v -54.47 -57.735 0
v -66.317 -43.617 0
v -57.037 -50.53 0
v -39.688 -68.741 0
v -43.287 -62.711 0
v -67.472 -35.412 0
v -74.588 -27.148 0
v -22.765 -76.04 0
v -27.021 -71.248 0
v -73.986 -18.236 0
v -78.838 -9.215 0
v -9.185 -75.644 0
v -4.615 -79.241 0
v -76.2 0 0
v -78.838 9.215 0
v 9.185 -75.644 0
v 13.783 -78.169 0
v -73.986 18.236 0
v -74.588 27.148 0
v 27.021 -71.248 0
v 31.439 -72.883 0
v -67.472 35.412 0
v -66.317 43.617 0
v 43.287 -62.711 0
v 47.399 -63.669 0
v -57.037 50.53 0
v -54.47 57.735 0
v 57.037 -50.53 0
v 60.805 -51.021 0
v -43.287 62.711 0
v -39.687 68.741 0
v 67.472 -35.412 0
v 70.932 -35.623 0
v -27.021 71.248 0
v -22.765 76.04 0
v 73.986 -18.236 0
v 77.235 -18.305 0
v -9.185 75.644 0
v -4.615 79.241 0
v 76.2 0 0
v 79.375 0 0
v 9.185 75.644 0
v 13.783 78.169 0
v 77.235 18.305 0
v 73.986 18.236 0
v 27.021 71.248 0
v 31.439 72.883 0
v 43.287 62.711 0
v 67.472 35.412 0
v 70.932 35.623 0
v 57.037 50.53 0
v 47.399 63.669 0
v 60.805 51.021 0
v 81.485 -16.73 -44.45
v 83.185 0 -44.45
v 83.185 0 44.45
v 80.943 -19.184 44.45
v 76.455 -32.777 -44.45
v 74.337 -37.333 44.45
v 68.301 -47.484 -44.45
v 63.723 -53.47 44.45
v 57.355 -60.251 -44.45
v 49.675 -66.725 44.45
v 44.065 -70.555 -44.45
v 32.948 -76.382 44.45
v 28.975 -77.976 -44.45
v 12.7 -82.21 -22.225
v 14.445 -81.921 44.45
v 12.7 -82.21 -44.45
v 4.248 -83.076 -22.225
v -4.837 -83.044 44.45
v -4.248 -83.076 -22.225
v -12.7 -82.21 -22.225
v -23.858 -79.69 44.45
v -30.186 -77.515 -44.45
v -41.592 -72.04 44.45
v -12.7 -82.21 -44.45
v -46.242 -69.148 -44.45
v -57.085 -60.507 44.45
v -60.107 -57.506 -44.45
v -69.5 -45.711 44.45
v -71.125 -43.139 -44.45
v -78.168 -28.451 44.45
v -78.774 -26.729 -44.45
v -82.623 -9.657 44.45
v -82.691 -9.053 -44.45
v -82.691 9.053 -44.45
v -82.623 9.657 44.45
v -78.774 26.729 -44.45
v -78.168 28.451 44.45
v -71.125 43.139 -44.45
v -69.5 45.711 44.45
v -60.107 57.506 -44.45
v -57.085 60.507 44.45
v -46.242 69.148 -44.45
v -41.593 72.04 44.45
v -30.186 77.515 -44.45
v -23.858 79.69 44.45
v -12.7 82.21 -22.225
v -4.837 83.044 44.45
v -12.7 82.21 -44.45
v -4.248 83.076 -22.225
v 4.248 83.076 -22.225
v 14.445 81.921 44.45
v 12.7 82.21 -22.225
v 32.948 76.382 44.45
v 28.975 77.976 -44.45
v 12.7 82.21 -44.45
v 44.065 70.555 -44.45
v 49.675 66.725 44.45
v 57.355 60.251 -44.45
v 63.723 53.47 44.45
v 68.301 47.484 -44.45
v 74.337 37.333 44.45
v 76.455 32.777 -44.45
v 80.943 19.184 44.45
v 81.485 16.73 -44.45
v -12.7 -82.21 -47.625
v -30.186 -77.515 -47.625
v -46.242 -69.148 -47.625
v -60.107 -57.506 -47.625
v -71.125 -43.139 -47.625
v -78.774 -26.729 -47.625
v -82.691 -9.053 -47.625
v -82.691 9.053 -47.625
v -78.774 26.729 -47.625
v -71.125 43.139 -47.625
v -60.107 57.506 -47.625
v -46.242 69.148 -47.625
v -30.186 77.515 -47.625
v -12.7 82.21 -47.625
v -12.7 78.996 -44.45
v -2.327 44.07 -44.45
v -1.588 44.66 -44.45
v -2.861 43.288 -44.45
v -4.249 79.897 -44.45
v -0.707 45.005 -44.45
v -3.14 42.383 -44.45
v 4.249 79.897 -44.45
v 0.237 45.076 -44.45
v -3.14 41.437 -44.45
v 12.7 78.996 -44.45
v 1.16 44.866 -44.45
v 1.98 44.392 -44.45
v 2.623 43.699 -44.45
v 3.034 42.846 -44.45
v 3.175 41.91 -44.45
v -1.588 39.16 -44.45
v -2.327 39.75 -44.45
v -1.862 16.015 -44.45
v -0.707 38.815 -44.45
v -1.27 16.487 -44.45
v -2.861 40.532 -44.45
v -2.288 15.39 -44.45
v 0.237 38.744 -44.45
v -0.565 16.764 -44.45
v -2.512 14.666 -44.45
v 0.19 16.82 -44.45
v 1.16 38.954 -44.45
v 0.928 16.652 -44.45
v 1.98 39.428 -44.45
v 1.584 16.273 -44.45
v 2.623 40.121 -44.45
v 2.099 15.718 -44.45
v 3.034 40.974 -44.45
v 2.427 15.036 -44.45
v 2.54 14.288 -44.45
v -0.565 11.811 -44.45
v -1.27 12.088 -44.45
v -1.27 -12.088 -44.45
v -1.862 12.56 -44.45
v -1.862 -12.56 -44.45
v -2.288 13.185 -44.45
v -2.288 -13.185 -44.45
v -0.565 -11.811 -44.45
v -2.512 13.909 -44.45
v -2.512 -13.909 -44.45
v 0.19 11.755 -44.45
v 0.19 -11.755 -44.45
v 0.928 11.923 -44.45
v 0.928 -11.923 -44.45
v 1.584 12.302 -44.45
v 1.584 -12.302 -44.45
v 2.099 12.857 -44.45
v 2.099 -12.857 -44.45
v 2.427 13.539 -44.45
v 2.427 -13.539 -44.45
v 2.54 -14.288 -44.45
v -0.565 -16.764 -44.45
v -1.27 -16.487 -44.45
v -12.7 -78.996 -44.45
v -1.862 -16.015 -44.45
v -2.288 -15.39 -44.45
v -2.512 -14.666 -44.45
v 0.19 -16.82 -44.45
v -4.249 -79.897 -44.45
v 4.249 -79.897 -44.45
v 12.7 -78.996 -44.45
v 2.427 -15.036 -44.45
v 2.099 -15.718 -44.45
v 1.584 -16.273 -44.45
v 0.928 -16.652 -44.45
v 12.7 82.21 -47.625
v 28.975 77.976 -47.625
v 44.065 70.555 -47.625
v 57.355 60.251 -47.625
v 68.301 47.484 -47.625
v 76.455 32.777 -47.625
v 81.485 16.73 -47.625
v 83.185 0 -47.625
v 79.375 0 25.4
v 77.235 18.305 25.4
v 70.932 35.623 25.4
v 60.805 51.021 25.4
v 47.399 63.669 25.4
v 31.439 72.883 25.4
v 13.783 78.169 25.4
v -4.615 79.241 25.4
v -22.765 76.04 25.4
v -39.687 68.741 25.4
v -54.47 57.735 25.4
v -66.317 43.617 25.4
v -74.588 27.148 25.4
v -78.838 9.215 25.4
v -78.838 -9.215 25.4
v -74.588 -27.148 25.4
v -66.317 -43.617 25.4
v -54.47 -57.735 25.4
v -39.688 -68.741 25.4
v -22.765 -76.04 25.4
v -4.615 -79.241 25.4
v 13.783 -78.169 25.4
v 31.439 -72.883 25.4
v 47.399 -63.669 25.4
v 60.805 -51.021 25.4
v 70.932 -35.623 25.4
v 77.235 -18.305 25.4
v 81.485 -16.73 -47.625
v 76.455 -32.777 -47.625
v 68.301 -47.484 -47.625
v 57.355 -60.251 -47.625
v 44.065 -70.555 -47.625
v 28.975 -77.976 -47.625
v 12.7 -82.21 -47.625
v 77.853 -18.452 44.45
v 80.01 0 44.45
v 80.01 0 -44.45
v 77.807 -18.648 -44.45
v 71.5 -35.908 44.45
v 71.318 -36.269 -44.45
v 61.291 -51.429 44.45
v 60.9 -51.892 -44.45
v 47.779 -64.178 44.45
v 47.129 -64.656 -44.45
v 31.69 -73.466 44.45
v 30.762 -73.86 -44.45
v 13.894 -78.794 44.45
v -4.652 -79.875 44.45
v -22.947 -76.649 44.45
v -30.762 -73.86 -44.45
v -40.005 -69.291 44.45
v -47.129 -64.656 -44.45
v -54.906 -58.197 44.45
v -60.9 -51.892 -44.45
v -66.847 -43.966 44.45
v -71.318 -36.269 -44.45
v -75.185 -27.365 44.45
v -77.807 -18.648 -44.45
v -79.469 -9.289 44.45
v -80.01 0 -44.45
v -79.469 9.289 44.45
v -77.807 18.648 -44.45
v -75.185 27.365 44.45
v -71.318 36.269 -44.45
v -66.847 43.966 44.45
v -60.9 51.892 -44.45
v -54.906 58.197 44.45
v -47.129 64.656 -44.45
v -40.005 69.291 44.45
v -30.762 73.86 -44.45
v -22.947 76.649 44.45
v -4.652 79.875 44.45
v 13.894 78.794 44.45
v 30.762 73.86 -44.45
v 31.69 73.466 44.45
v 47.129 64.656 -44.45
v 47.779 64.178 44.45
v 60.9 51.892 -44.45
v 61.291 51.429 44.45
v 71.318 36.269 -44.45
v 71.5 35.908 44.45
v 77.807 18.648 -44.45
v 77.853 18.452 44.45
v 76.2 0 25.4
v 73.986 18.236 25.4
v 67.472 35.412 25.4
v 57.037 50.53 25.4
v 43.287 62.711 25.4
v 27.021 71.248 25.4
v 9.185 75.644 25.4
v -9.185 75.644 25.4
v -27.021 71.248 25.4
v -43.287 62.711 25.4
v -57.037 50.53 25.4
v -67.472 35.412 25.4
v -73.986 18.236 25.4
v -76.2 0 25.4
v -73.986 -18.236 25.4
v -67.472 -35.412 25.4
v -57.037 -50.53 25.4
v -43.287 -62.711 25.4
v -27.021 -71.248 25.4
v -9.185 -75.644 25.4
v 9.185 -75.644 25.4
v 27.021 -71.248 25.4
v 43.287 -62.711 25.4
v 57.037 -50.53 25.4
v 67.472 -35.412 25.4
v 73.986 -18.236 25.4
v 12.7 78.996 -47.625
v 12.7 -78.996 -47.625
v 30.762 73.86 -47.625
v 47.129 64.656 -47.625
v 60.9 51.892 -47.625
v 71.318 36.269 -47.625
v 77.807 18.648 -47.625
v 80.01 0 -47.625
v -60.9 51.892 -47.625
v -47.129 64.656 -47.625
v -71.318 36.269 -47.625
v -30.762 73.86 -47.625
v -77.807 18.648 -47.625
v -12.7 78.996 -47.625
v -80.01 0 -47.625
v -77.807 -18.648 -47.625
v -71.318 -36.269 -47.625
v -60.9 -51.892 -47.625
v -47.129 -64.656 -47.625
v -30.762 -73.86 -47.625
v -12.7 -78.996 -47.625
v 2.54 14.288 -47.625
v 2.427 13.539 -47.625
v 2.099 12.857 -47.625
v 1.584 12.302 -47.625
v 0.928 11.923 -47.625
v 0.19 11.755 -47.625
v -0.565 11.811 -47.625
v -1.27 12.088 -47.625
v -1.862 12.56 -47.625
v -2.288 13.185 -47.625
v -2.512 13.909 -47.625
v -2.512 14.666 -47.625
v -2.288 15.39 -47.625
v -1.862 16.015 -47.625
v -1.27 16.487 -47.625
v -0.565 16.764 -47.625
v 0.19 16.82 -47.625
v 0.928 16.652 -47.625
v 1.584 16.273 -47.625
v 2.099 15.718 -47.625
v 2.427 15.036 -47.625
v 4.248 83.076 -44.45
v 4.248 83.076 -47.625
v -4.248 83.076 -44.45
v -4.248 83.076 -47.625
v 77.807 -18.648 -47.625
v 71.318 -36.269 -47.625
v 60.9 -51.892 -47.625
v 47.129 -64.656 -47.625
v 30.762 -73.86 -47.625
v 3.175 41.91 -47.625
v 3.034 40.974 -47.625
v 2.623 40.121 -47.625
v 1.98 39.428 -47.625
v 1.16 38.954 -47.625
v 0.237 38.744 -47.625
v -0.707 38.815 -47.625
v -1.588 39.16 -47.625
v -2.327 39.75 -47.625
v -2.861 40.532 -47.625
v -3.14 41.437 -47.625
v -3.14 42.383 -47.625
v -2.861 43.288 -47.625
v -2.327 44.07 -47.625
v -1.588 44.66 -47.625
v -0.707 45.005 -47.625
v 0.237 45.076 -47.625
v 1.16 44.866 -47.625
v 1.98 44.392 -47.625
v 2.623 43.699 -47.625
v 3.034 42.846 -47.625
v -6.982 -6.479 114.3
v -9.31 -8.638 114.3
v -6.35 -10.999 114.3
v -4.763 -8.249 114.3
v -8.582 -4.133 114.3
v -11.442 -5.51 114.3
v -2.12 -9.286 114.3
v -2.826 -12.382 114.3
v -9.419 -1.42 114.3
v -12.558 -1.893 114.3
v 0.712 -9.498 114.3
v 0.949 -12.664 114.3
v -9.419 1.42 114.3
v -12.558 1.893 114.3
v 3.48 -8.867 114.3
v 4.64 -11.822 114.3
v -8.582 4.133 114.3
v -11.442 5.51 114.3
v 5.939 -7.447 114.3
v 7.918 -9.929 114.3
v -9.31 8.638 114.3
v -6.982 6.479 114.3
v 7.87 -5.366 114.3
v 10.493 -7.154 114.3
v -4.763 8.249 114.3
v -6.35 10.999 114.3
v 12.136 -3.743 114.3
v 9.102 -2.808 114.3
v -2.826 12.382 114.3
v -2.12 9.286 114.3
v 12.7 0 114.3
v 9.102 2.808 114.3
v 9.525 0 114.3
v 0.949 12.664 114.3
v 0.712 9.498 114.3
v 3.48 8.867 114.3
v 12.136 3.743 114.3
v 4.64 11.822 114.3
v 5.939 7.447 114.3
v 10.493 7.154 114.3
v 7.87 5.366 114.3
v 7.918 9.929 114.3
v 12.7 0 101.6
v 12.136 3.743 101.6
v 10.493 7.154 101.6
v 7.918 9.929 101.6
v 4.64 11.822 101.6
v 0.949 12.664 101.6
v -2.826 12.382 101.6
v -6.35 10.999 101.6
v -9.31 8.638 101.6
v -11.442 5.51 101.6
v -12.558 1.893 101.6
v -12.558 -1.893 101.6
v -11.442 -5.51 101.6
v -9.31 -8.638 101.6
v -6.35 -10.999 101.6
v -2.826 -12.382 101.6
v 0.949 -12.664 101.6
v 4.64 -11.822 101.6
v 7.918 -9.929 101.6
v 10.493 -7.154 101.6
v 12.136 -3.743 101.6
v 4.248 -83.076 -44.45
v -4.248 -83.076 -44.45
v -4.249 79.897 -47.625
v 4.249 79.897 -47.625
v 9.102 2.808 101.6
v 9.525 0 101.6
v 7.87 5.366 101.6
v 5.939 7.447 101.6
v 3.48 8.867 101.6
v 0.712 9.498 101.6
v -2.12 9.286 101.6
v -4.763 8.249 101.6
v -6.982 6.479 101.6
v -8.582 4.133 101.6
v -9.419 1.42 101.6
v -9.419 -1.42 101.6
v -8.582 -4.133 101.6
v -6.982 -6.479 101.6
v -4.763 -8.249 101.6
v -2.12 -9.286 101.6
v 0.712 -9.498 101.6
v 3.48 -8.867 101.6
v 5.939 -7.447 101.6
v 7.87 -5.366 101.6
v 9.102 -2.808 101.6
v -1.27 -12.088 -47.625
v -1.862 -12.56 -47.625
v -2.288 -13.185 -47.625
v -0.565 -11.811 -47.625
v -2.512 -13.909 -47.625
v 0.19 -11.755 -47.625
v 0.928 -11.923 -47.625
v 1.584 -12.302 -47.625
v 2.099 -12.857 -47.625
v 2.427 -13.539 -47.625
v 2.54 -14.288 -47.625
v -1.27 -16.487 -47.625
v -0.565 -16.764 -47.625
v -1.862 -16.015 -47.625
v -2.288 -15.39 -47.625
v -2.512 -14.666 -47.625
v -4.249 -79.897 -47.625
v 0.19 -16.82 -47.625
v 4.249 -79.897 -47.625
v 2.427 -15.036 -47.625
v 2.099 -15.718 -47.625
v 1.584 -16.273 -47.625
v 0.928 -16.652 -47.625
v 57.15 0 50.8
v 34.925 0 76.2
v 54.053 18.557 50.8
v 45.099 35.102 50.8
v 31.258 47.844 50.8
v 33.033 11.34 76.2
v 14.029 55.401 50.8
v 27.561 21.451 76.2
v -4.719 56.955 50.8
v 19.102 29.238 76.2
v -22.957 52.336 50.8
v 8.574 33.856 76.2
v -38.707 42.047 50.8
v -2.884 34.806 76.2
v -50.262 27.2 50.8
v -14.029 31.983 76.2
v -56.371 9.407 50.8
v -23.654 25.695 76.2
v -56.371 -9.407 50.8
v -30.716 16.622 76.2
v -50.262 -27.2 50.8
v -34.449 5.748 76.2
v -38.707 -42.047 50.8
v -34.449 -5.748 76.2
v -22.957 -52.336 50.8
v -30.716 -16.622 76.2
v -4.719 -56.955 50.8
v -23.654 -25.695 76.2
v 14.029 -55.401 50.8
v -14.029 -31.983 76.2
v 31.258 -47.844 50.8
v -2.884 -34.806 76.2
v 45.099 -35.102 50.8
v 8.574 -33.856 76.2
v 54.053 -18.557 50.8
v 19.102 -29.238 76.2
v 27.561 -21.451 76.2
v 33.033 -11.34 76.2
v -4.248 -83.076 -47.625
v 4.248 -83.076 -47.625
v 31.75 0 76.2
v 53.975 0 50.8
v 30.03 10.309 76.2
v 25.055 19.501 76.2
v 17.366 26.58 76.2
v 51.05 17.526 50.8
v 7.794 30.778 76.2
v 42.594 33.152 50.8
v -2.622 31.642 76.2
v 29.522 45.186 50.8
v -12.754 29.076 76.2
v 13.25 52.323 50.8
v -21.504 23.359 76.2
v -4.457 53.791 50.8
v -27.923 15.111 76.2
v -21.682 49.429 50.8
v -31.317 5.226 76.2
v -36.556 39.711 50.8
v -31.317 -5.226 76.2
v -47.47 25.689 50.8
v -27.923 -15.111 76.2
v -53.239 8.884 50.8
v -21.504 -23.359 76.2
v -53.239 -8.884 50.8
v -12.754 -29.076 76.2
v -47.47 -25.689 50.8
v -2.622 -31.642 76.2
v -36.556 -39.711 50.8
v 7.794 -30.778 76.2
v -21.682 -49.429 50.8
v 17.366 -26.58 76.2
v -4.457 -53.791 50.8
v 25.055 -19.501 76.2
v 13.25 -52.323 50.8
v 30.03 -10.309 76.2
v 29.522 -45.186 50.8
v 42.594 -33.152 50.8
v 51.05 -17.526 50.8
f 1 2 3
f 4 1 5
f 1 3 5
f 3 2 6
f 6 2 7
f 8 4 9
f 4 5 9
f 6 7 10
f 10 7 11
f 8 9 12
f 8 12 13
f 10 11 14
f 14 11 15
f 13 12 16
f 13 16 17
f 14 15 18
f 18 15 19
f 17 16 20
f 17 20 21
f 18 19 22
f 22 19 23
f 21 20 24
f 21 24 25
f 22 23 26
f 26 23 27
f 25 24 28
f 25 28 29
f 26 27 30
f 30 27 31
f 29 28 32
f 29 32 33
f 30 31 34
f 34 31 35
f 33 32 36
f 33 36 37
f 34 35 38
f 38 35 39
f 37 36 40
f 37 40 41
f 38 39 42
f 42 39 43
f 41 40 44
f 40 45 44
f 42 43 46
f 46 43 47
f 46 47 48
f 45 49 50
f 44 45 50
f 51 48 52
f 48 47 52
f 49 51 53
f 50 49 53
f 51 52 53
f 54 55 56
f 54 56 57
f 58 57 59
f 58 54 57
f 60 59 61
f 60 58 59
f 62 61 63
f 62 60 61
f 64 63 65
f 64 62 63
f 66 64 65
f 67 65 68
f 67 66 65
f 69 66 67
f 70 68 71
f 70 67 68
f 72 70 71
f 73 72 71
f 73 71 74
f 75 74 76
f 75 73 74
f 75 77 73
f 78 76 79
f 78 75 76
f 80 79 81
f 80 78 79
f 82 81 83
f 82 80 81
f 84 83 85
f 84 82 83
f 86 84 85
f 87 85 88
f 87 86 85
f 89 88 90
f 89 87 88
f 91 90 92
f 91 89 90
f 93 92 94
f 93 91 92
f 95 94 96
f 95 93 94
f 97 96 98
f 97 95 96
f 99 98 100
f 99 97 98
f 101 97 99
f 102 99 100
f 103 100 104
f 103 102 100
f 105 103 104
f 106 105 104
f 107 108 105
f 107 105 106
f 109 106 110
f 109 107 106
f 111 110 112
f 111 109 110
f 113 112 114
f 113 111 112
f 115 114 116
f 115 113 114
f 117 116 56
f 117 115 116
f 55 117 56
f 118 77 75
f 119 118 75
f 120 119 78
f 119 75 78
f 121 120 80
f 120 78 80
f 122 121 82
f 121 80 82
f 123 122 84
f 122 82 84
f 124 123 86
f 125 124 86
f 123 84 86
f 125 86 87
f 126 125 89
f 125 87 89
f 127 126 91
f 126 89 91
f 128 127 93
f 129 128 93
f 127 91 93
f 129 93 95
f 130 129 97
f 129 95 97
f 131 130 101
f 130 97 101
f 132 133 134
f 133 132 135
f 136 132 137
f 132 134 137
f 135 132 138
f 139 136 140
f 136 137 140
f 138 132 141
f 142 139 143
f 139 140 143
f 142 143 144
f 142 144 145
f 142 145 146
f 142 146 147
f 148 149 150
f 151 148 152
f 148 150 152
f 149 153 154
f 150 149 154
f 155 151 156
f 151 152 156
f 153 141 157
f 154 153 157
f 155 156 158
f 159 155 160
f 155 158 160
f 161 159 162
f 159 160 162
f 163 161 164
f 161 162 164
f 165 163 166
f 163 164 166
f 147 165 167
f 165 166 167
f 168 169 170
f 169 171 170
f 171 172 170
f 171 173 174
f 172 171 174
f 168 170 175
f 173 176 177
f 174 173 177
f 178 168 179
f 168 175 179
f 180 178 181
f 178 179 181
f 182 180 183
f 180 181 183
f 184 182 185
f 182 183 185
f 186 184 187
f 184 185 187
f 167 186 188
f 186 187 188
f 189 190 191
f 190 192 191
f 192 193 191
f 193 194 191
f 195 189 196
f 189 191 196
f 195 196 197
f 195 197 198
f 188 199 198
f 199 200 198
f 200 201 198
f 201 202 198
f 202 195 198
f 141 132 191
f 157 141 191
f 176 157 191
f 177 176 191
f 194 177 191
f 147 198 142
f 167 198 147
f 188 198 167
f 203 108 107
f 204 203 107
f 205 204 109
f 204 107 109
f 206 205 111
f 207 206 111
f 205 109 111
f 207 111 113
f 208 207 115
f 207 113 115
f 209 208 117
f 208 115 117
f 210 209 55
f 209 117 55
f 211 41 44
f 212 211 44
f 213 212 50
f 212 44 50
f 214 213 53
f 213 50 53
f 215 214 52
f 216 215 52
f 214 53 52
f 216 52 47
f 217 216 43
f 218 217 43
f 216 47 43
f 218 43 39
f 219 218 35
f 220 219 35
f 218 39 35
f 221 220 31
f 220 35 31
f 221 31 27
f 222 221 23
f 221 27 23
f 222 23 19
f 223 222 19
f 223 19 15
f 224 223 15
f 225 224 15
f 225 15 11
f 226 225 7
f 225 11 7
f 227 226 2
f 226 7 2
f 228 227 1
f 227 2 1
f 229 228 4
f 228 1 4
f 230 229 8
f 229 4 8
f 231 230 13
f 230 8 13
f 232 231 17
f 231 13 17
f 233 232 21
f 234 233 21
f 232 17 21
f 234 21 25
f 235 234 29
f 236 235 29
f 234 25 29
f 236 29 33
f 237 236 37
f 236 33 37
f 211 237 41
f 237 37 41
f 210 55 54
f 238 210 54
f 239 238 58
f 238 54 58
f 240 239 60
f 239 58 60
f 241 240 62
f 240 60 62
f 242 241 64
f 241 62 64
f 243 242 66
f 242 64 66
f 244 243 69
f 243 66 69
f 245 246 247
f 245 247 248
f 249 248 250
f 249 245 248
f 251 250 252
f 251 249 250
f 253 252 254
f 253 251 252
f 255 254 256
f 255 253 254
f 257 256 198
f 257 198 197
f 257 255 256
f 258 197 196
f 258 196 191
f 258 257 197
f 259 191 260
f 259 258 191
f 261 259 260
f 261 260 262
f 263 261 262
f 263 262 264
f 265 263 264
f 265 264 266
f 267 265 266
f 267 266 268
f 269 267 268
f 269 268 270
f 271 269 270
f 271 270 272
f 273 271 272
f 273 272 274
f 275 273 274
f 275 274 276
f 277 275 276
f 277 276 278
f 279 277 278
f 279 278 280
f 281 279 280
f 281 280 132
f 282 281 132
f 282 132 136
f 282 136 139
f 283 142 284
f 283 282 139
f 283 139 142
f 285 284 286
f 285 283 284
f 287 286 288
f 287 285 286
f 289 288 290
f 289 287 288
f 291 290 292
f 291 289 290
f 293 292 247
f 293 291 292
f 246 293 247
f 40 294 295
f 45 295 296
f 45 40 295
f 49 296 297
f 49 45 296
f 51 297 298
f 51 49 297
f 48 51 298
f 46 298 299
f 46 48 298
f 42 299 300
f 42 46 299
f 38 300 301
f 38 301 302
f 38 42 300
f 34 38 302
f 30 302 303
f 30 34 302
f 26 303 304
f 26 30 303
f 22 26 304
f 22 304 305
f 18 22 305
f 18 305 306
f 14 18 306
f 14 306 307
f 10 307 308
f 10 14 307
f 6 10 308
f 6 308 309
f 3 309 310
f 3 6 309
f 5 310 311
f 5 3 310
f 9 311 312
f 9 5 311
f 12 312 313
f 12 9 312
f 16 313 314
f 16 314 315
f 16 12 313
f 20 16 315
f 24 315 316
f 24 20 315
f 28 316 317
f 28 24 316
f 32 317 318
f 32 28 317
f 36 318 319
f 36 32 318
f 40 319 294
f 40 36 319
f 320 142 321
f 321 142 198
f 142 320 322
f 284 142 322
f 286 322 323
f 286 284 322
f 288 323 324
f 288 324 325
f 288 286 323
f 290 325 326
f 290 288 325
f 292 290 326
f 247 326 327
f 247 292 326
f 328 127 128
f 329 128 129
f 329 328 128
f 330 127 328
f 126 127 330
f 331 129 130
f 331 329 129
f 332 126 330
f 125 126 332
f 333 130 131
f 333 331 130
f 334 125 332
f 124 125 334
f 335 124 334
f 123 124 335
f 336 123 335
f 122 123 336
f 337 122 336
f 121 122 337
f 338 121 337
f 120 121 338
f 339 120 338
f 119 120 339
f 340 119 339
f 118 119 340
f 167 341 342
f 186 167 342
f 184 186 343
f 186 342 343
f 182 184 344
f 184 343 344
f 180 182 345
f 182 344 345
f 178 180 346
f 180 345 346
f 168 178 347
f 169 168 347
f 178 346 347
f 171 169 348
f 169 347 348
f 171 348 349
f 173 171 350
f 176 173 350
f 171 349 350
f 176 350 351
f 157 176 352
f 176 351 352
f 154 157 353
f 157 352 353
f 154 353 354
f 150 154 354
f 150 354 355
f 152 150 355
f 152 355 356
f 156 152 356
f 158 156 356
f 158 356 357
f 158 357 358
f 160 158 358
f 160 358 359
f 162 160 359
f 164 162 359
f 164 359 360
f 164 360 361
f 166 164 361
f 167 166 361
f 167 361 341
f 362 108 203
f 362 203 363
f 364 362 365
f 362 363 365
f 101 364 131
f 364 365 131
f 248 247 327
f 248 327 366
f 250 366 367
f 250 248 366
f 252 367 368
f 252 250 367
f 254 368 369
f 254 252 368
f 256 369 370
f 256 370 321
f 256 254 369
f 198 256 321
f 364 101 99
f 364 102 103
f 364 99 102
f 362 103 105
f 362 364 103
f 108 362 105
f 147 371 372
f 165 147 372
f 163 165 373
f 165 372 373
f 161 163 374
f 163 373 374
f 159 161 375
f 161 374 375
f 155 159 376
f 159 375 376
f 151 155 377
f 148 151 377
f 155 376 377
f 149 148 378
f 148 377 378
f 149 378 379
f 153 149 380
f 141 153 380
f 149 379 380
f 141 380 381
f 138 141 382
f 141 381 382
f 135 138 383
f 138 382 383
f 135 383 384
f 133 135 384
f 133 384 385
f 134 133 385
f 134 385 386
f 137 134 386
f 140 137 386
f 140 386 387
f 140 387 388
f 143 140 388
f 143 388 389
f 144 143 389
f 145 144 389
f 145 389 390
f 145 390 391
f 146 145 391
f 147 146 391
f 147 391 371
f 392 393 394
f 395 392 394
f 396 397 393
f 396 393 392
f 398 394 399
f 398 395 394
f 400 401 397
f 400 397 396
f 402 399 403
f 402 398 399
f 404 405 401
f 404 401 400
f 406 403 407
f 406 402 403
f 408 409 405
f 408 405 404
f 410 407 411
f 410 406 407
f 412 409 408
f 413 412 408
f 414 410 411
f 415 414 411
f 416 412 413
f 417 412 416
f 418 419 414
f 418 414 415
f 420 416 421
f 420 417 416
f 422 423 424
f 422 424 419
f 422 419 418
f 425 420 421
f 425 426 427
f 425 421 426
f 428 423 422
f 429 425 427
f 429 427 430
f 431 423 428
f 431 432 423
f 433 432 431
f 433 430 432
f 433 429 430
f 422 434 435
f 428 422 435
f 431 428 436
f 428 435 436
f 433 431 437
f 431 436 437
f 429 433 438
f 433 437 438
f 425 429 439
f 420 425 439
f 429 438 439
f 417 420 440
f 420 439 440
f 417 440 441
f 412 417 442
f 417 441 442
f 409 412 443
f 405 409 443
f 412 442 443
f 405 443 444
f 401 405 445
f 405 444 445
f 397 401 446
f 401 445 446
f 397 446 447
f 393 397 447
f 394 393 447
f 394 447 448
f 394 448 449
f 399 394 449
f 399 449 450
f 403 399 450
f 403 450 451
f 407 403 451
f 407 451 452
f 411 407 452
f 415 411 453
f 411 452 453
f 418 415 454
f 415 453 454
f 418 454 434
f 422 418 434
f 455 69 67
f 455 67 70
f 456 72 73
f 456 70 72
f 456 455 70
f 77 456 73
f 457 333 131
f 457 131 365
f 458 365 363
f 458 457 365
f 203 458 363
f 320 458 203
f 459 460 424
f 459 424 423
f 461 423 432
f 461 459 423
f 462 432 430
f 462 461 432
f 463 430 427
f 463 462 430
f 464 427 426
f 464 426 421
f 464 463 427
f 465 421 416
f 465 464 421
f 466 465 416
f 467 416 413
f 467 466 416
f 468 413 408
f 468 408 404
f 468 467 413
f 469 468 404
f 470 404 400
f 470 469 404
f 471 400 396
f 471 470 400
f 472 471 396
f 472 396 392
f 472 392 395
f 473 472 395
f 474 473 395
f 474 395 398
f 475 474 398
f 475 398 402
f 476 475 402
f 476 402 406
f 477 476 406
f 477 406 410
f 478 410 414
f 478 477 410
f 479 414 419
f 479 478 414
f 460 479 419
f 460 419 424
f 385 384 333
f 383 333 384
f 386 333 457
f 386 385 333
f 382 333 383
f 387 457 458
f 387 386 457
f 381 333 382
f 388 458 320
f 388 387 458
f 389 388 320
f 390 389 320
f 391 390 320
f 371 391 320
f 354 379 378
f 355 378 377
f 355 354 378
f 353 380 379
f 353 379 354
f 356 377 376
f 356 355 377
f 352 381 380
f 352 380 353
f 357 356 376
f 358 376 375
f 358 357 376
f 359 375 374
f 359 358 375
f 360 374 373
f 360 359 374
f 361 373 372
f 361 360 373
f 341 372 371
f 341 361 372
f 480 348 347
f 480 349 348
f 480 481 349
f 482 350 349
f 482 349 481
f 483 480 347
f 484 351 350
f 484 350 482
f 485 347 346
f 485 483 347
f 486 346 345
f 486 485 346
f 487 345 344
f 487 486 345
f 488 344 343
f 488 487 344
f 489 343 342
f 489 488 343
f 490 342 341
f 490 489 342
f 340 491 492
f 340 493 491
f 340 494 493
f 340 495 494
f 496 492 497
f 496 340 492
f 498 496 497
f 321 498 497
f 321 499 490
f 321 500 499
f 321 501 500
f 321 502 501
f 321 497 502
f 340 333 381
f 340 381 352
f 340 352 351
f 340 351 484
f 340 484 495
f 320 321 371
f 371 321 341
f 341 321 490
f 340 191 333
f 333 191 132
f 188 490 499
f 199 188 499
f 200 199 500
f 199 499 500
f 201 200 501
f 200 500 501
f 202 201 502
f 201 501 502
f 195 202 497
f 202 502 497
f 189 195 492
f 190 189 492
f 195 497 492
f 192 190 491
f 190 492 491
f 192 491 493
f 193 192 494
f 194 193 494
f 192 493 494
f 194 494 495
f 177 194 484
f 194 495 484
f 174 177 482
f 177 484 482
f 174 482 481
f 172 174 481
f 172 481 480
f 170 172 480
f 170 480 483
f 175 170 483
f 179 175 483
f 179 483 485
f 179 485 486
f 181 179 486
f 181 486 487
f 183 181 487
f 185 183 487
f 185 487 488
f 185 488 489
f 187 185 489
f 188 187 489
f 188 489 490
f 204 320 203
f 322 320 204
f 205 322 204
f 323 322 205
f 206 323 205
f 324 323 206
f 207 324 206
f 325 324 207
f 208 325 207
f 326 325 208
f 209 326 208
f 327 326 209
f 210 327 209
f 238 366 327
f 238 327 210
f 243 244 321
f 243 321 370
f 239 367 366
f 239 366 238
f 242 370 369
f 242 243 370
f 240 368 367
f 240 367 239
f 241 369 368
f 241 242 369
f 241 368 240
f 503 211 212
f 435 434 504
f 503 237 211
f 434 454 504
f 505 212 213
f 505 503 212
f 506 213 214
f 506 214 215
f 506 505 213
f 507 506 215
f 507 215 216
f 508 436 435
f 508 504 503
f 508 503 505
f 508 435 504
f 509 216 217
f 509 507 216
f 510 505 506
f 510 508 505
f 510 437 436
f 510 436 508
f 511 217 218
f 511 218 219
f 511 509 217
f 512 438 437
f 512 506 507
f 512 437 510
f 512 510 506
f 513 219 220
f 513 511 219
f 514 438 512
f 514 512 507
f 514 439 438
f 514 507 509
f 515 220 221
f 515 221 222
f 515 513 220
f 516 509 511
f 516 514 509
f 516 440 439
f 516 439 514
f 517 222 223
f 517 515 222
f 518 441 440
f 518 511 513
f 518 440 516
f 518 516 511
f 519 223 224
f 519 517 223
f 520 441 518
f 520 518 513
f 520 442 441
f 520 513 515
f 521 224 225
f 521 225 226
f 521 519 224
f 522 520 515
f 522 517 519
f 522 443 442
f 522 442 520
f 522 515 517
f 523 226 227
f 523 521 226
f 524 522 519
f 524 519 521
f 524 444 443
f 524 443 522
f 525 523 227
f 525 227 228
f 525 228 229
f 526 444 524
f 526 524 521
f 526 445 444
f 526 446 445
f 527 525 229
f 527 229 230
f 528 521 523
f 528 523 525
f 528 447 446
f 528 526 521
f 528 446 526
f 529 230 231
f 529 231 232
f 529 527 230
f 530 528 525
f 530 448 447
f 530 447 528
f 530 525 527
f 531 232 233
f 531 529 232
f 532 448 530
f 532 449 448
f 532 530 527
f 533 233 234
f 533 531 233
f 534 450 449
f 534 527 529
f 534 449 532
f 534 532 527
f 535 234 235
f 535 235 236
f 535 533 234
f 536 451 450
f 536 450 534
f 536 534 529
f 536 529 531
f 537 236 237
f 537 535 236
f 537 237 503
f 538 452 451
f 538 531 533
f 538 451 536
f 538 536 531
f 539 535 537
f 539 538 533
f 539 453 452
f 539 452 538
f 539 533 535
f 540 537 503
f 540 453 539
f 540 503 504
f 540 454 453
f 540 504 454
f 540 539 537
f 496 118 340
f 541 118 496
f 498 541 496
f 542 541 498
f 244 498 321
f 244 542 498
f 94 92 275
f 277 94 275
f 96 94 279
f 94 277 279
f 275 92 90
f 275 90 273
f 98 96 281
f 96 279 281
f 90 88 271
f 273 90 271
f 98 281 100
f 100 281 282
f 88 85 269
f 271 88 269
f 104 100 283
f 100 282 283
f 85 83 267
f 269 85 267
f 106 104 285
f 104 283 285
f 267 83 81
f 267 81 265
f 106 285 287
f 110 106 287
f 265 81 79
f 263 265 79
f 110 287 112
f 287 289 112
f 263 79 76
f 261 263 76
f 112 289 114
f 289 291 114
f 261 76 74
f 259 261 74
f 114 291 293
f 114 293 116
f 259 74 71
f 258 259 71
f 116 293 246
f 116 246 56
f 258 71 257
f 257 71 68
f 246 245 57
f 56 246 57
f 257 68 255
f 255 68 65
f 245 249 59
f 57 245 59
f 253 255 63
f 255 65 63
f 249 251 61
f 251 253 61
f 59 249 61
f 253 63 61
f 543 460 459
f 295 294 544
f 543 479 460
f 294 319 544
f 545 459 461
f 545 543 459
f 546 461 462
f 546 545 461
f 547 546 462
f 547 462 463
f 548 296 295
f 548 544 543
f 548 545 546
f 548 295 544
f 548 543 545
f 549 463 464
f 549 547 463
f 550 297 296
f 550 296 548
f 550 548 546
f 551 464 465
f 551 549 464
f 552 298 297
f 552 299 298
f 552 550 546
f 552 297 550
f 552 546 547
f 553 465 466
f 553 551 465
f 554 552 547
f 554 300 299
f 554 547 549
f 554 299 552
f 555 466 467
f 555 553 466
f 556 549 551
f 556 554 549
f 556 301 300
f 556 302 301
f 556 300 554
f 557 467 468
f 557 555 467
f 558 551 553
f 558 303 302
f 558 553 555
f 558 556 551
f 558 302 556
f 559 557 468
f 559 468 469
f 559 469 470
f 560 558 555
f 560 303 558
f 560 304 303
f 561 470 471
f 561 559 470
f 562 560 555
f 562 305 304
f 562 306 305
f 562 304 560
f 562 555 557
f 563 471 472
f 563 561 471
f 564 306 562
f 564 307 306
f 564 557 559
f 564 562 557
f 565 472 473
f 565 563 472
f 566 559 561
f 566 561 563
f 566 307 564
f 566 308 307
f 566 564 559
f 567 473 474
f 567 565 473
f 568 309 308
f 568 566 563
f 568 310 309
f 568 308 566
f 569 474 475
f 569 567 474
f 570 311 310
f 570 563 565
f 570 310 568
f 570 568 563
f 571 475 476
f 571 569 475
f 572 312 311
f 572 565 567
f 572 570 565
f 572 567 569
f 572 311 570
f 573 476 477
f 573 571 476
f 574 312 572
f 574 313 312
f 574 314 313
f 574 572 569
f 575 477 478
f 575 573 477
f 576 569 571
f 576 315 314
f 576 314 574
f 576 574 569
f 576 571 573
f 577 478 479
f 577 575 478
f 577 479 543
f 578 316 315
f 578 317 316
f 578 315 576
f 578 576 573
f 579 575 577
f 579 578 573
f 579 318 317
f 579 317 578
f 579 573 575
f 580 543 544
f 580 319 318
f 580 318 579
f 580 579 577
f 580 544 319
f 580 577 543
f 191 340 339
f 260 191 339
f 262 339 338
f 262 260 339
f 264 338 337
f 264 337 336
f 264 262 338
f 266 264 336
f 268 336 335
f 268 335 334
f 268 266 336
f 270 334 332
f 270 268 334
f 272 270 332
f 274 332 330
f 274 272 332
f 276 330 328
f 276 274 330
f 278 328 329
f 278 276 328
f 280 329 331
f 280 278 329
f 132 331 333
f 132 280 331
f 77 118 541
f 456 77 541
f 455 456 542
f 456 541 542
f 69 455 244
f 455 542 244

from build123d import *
from build123d import SkipClean  # not in build123d's __all__

# Parameters (mm, degrees)
F0_R      = 79.375
F0_R_2    = 76.2
F1_DEPTH  = 25.4
F4_R      = 79.375
F3_R      = 12.7
F7_R      = 9.525
F6_R      = 76.2
F9_R      = 12.7
F9_R_2    = 9.525
F10_DEPTH = 12.7
F11_R     = 83.185
F11_R_2   = 80.01
F12_DEPTH = 44.45
F14_DEPTH = 3.175
F15_R     = 83.185
F15_R_2   = 80.01
F16_DEPTH = 3.175
F17_R     = 2.54
F17_R_2   = 3.175
F18_DEPTH = 161.926
F20_DEPTH = 25.4


with BuildPart() as f1:
    # F0 (on Top) → F1 (new body)
    with BuildSketch(Plane.XY):
        Circle(F0_R)
        Circle(F0_R_2, mode=Mode.SUBTRACT)
    extrude(amount=F1_DEPTH)

    # F4 (on face) → F5 section 0
    with BuildSketch(Plane.XY.offset(25.4)):
        Circle(F4_R)
    # F3 (on offset) → F5 section 1
    with BuildSketch(Plane.XY.offset(101.6)):
        Circle(F3_R)
    loft()

    # F7 (on face) → F8 section 0
    with BuildSketch(Plane.XY.offset(101.6)):
        Circle(F7_R)
    # F6 (on face) → F8 section 1
    with BuildSketch(Plane(origin=(0, 0, 25.4), x_dir=(1, 0, 0), z_dir=(0, 0, -1))):
        Circle(F6_R)
    loft(mode=Mode.SUBTRACT)

    # F9 (on face) → F10 (join)
    with BuildSketch(Plane.XY.offset(101.6)):
        Circle(F9_R)
        Circle(F9_R_2, mode=Mode.SUBTRACT)
    extrude(amount=F10_DEPTH)


with BuildPart() as f12:
    # F11 (on face) → F12 (new body, symmetric)
    with BuildSketch(Plane(origin=(0, 0, 0), x_dir=(1, 0, 0), z_dir=(0, 0, -1))):
        Circle(F11_R)
        Circle(F11_R_2, mode=Mode.SUBTRACT)
    extrude(amount=F12_DEPTH, both=True)

    # F13 (on face) → F14 (join)
    with BuildSketch(Plane(origin=(0, 0, -44.45), x_dir=(1, 0, 0), z_dir=(0, 0, -1))):
        Polygon((-12.7, 104.3956334236), (-12.7, 78.9956334236), (-12.7, -78.9956334236), (-12.7, -104.3956334236), (12.7, -104.3956334236), (12.7, -78.9956334236), (12.7, 78.9956334236), (12.7, 104.3956334236), align=None)
    extrude(amount=F14_DEPTH)

    # F15 (on face) → F16 (join)
    with BuildSketch(Plane(origin=(0, 0, -44.45), x_dir=(1, 0, 0), z_dir=(0, 0, -1))):
        Circle(F15_R)
        Circle(F15_R_2, mode=Mode.SUBTRACT)
    extrude(amount=F16_DEPTH)

    # F17 (on face) → F18 (cut, through all)
    with BuildSketch(Plane(origin=(0, 0, -47.625), x_dir=(1, 0, 0), z_dir=(0, 0, -1))):
        with Locations((0, 14.2875)):
            Circle(F17_R)
        with Locations((0, -14.2875)):
            Circle(F17_R)
        with Locations((0, -41.91)):
            Circle(F17_R_2)
    extrude(amount=-F18_DEPTH, mode=Mode.SUBTRACT)

    # F19 (on face) → F20 (cut)
    with BuildSketch(Plane(origin=(0, 0, -47.625), x_dir=(1, 0, 0), z_dir=(0, 0, -1))):
        with BuildLine():
            Line((12.7, 104.3956334236), (-12.7, 104.3956334236))
            Line((-12.7, 104.3956334236), (-12.7, 82.2098183005))
            ThreePointArc((-12.7, 82.2098183005), (0, 83.185), (12.7, 82.2098183005))
            Line((12.7, 82.2098183005), (12.7, 104.3956334236))
        make_face()
        with BuildLine():
            ThreePointArc((12.7, -82.2098183005), (0, -83.185), (-12.7, -82.2098183005))
            Line((-12.7, -82.2098183005), (-12.7, -104.3956334236))
            Line((-12.7, -104.3956334236), (12.7, -104.3956334236))
            Line((12.7, -104.3956334236), (12.7, -82.2098183005))
        make_face()
    with SkipClean():  # cleaning this boolean's faces spoils the solid; the shape is the same uncleaned
        extrude(amount=-F20_DEPTH, mode=Mode.SUBTRACT)


solid = Compound([f1.part, f12.part])
